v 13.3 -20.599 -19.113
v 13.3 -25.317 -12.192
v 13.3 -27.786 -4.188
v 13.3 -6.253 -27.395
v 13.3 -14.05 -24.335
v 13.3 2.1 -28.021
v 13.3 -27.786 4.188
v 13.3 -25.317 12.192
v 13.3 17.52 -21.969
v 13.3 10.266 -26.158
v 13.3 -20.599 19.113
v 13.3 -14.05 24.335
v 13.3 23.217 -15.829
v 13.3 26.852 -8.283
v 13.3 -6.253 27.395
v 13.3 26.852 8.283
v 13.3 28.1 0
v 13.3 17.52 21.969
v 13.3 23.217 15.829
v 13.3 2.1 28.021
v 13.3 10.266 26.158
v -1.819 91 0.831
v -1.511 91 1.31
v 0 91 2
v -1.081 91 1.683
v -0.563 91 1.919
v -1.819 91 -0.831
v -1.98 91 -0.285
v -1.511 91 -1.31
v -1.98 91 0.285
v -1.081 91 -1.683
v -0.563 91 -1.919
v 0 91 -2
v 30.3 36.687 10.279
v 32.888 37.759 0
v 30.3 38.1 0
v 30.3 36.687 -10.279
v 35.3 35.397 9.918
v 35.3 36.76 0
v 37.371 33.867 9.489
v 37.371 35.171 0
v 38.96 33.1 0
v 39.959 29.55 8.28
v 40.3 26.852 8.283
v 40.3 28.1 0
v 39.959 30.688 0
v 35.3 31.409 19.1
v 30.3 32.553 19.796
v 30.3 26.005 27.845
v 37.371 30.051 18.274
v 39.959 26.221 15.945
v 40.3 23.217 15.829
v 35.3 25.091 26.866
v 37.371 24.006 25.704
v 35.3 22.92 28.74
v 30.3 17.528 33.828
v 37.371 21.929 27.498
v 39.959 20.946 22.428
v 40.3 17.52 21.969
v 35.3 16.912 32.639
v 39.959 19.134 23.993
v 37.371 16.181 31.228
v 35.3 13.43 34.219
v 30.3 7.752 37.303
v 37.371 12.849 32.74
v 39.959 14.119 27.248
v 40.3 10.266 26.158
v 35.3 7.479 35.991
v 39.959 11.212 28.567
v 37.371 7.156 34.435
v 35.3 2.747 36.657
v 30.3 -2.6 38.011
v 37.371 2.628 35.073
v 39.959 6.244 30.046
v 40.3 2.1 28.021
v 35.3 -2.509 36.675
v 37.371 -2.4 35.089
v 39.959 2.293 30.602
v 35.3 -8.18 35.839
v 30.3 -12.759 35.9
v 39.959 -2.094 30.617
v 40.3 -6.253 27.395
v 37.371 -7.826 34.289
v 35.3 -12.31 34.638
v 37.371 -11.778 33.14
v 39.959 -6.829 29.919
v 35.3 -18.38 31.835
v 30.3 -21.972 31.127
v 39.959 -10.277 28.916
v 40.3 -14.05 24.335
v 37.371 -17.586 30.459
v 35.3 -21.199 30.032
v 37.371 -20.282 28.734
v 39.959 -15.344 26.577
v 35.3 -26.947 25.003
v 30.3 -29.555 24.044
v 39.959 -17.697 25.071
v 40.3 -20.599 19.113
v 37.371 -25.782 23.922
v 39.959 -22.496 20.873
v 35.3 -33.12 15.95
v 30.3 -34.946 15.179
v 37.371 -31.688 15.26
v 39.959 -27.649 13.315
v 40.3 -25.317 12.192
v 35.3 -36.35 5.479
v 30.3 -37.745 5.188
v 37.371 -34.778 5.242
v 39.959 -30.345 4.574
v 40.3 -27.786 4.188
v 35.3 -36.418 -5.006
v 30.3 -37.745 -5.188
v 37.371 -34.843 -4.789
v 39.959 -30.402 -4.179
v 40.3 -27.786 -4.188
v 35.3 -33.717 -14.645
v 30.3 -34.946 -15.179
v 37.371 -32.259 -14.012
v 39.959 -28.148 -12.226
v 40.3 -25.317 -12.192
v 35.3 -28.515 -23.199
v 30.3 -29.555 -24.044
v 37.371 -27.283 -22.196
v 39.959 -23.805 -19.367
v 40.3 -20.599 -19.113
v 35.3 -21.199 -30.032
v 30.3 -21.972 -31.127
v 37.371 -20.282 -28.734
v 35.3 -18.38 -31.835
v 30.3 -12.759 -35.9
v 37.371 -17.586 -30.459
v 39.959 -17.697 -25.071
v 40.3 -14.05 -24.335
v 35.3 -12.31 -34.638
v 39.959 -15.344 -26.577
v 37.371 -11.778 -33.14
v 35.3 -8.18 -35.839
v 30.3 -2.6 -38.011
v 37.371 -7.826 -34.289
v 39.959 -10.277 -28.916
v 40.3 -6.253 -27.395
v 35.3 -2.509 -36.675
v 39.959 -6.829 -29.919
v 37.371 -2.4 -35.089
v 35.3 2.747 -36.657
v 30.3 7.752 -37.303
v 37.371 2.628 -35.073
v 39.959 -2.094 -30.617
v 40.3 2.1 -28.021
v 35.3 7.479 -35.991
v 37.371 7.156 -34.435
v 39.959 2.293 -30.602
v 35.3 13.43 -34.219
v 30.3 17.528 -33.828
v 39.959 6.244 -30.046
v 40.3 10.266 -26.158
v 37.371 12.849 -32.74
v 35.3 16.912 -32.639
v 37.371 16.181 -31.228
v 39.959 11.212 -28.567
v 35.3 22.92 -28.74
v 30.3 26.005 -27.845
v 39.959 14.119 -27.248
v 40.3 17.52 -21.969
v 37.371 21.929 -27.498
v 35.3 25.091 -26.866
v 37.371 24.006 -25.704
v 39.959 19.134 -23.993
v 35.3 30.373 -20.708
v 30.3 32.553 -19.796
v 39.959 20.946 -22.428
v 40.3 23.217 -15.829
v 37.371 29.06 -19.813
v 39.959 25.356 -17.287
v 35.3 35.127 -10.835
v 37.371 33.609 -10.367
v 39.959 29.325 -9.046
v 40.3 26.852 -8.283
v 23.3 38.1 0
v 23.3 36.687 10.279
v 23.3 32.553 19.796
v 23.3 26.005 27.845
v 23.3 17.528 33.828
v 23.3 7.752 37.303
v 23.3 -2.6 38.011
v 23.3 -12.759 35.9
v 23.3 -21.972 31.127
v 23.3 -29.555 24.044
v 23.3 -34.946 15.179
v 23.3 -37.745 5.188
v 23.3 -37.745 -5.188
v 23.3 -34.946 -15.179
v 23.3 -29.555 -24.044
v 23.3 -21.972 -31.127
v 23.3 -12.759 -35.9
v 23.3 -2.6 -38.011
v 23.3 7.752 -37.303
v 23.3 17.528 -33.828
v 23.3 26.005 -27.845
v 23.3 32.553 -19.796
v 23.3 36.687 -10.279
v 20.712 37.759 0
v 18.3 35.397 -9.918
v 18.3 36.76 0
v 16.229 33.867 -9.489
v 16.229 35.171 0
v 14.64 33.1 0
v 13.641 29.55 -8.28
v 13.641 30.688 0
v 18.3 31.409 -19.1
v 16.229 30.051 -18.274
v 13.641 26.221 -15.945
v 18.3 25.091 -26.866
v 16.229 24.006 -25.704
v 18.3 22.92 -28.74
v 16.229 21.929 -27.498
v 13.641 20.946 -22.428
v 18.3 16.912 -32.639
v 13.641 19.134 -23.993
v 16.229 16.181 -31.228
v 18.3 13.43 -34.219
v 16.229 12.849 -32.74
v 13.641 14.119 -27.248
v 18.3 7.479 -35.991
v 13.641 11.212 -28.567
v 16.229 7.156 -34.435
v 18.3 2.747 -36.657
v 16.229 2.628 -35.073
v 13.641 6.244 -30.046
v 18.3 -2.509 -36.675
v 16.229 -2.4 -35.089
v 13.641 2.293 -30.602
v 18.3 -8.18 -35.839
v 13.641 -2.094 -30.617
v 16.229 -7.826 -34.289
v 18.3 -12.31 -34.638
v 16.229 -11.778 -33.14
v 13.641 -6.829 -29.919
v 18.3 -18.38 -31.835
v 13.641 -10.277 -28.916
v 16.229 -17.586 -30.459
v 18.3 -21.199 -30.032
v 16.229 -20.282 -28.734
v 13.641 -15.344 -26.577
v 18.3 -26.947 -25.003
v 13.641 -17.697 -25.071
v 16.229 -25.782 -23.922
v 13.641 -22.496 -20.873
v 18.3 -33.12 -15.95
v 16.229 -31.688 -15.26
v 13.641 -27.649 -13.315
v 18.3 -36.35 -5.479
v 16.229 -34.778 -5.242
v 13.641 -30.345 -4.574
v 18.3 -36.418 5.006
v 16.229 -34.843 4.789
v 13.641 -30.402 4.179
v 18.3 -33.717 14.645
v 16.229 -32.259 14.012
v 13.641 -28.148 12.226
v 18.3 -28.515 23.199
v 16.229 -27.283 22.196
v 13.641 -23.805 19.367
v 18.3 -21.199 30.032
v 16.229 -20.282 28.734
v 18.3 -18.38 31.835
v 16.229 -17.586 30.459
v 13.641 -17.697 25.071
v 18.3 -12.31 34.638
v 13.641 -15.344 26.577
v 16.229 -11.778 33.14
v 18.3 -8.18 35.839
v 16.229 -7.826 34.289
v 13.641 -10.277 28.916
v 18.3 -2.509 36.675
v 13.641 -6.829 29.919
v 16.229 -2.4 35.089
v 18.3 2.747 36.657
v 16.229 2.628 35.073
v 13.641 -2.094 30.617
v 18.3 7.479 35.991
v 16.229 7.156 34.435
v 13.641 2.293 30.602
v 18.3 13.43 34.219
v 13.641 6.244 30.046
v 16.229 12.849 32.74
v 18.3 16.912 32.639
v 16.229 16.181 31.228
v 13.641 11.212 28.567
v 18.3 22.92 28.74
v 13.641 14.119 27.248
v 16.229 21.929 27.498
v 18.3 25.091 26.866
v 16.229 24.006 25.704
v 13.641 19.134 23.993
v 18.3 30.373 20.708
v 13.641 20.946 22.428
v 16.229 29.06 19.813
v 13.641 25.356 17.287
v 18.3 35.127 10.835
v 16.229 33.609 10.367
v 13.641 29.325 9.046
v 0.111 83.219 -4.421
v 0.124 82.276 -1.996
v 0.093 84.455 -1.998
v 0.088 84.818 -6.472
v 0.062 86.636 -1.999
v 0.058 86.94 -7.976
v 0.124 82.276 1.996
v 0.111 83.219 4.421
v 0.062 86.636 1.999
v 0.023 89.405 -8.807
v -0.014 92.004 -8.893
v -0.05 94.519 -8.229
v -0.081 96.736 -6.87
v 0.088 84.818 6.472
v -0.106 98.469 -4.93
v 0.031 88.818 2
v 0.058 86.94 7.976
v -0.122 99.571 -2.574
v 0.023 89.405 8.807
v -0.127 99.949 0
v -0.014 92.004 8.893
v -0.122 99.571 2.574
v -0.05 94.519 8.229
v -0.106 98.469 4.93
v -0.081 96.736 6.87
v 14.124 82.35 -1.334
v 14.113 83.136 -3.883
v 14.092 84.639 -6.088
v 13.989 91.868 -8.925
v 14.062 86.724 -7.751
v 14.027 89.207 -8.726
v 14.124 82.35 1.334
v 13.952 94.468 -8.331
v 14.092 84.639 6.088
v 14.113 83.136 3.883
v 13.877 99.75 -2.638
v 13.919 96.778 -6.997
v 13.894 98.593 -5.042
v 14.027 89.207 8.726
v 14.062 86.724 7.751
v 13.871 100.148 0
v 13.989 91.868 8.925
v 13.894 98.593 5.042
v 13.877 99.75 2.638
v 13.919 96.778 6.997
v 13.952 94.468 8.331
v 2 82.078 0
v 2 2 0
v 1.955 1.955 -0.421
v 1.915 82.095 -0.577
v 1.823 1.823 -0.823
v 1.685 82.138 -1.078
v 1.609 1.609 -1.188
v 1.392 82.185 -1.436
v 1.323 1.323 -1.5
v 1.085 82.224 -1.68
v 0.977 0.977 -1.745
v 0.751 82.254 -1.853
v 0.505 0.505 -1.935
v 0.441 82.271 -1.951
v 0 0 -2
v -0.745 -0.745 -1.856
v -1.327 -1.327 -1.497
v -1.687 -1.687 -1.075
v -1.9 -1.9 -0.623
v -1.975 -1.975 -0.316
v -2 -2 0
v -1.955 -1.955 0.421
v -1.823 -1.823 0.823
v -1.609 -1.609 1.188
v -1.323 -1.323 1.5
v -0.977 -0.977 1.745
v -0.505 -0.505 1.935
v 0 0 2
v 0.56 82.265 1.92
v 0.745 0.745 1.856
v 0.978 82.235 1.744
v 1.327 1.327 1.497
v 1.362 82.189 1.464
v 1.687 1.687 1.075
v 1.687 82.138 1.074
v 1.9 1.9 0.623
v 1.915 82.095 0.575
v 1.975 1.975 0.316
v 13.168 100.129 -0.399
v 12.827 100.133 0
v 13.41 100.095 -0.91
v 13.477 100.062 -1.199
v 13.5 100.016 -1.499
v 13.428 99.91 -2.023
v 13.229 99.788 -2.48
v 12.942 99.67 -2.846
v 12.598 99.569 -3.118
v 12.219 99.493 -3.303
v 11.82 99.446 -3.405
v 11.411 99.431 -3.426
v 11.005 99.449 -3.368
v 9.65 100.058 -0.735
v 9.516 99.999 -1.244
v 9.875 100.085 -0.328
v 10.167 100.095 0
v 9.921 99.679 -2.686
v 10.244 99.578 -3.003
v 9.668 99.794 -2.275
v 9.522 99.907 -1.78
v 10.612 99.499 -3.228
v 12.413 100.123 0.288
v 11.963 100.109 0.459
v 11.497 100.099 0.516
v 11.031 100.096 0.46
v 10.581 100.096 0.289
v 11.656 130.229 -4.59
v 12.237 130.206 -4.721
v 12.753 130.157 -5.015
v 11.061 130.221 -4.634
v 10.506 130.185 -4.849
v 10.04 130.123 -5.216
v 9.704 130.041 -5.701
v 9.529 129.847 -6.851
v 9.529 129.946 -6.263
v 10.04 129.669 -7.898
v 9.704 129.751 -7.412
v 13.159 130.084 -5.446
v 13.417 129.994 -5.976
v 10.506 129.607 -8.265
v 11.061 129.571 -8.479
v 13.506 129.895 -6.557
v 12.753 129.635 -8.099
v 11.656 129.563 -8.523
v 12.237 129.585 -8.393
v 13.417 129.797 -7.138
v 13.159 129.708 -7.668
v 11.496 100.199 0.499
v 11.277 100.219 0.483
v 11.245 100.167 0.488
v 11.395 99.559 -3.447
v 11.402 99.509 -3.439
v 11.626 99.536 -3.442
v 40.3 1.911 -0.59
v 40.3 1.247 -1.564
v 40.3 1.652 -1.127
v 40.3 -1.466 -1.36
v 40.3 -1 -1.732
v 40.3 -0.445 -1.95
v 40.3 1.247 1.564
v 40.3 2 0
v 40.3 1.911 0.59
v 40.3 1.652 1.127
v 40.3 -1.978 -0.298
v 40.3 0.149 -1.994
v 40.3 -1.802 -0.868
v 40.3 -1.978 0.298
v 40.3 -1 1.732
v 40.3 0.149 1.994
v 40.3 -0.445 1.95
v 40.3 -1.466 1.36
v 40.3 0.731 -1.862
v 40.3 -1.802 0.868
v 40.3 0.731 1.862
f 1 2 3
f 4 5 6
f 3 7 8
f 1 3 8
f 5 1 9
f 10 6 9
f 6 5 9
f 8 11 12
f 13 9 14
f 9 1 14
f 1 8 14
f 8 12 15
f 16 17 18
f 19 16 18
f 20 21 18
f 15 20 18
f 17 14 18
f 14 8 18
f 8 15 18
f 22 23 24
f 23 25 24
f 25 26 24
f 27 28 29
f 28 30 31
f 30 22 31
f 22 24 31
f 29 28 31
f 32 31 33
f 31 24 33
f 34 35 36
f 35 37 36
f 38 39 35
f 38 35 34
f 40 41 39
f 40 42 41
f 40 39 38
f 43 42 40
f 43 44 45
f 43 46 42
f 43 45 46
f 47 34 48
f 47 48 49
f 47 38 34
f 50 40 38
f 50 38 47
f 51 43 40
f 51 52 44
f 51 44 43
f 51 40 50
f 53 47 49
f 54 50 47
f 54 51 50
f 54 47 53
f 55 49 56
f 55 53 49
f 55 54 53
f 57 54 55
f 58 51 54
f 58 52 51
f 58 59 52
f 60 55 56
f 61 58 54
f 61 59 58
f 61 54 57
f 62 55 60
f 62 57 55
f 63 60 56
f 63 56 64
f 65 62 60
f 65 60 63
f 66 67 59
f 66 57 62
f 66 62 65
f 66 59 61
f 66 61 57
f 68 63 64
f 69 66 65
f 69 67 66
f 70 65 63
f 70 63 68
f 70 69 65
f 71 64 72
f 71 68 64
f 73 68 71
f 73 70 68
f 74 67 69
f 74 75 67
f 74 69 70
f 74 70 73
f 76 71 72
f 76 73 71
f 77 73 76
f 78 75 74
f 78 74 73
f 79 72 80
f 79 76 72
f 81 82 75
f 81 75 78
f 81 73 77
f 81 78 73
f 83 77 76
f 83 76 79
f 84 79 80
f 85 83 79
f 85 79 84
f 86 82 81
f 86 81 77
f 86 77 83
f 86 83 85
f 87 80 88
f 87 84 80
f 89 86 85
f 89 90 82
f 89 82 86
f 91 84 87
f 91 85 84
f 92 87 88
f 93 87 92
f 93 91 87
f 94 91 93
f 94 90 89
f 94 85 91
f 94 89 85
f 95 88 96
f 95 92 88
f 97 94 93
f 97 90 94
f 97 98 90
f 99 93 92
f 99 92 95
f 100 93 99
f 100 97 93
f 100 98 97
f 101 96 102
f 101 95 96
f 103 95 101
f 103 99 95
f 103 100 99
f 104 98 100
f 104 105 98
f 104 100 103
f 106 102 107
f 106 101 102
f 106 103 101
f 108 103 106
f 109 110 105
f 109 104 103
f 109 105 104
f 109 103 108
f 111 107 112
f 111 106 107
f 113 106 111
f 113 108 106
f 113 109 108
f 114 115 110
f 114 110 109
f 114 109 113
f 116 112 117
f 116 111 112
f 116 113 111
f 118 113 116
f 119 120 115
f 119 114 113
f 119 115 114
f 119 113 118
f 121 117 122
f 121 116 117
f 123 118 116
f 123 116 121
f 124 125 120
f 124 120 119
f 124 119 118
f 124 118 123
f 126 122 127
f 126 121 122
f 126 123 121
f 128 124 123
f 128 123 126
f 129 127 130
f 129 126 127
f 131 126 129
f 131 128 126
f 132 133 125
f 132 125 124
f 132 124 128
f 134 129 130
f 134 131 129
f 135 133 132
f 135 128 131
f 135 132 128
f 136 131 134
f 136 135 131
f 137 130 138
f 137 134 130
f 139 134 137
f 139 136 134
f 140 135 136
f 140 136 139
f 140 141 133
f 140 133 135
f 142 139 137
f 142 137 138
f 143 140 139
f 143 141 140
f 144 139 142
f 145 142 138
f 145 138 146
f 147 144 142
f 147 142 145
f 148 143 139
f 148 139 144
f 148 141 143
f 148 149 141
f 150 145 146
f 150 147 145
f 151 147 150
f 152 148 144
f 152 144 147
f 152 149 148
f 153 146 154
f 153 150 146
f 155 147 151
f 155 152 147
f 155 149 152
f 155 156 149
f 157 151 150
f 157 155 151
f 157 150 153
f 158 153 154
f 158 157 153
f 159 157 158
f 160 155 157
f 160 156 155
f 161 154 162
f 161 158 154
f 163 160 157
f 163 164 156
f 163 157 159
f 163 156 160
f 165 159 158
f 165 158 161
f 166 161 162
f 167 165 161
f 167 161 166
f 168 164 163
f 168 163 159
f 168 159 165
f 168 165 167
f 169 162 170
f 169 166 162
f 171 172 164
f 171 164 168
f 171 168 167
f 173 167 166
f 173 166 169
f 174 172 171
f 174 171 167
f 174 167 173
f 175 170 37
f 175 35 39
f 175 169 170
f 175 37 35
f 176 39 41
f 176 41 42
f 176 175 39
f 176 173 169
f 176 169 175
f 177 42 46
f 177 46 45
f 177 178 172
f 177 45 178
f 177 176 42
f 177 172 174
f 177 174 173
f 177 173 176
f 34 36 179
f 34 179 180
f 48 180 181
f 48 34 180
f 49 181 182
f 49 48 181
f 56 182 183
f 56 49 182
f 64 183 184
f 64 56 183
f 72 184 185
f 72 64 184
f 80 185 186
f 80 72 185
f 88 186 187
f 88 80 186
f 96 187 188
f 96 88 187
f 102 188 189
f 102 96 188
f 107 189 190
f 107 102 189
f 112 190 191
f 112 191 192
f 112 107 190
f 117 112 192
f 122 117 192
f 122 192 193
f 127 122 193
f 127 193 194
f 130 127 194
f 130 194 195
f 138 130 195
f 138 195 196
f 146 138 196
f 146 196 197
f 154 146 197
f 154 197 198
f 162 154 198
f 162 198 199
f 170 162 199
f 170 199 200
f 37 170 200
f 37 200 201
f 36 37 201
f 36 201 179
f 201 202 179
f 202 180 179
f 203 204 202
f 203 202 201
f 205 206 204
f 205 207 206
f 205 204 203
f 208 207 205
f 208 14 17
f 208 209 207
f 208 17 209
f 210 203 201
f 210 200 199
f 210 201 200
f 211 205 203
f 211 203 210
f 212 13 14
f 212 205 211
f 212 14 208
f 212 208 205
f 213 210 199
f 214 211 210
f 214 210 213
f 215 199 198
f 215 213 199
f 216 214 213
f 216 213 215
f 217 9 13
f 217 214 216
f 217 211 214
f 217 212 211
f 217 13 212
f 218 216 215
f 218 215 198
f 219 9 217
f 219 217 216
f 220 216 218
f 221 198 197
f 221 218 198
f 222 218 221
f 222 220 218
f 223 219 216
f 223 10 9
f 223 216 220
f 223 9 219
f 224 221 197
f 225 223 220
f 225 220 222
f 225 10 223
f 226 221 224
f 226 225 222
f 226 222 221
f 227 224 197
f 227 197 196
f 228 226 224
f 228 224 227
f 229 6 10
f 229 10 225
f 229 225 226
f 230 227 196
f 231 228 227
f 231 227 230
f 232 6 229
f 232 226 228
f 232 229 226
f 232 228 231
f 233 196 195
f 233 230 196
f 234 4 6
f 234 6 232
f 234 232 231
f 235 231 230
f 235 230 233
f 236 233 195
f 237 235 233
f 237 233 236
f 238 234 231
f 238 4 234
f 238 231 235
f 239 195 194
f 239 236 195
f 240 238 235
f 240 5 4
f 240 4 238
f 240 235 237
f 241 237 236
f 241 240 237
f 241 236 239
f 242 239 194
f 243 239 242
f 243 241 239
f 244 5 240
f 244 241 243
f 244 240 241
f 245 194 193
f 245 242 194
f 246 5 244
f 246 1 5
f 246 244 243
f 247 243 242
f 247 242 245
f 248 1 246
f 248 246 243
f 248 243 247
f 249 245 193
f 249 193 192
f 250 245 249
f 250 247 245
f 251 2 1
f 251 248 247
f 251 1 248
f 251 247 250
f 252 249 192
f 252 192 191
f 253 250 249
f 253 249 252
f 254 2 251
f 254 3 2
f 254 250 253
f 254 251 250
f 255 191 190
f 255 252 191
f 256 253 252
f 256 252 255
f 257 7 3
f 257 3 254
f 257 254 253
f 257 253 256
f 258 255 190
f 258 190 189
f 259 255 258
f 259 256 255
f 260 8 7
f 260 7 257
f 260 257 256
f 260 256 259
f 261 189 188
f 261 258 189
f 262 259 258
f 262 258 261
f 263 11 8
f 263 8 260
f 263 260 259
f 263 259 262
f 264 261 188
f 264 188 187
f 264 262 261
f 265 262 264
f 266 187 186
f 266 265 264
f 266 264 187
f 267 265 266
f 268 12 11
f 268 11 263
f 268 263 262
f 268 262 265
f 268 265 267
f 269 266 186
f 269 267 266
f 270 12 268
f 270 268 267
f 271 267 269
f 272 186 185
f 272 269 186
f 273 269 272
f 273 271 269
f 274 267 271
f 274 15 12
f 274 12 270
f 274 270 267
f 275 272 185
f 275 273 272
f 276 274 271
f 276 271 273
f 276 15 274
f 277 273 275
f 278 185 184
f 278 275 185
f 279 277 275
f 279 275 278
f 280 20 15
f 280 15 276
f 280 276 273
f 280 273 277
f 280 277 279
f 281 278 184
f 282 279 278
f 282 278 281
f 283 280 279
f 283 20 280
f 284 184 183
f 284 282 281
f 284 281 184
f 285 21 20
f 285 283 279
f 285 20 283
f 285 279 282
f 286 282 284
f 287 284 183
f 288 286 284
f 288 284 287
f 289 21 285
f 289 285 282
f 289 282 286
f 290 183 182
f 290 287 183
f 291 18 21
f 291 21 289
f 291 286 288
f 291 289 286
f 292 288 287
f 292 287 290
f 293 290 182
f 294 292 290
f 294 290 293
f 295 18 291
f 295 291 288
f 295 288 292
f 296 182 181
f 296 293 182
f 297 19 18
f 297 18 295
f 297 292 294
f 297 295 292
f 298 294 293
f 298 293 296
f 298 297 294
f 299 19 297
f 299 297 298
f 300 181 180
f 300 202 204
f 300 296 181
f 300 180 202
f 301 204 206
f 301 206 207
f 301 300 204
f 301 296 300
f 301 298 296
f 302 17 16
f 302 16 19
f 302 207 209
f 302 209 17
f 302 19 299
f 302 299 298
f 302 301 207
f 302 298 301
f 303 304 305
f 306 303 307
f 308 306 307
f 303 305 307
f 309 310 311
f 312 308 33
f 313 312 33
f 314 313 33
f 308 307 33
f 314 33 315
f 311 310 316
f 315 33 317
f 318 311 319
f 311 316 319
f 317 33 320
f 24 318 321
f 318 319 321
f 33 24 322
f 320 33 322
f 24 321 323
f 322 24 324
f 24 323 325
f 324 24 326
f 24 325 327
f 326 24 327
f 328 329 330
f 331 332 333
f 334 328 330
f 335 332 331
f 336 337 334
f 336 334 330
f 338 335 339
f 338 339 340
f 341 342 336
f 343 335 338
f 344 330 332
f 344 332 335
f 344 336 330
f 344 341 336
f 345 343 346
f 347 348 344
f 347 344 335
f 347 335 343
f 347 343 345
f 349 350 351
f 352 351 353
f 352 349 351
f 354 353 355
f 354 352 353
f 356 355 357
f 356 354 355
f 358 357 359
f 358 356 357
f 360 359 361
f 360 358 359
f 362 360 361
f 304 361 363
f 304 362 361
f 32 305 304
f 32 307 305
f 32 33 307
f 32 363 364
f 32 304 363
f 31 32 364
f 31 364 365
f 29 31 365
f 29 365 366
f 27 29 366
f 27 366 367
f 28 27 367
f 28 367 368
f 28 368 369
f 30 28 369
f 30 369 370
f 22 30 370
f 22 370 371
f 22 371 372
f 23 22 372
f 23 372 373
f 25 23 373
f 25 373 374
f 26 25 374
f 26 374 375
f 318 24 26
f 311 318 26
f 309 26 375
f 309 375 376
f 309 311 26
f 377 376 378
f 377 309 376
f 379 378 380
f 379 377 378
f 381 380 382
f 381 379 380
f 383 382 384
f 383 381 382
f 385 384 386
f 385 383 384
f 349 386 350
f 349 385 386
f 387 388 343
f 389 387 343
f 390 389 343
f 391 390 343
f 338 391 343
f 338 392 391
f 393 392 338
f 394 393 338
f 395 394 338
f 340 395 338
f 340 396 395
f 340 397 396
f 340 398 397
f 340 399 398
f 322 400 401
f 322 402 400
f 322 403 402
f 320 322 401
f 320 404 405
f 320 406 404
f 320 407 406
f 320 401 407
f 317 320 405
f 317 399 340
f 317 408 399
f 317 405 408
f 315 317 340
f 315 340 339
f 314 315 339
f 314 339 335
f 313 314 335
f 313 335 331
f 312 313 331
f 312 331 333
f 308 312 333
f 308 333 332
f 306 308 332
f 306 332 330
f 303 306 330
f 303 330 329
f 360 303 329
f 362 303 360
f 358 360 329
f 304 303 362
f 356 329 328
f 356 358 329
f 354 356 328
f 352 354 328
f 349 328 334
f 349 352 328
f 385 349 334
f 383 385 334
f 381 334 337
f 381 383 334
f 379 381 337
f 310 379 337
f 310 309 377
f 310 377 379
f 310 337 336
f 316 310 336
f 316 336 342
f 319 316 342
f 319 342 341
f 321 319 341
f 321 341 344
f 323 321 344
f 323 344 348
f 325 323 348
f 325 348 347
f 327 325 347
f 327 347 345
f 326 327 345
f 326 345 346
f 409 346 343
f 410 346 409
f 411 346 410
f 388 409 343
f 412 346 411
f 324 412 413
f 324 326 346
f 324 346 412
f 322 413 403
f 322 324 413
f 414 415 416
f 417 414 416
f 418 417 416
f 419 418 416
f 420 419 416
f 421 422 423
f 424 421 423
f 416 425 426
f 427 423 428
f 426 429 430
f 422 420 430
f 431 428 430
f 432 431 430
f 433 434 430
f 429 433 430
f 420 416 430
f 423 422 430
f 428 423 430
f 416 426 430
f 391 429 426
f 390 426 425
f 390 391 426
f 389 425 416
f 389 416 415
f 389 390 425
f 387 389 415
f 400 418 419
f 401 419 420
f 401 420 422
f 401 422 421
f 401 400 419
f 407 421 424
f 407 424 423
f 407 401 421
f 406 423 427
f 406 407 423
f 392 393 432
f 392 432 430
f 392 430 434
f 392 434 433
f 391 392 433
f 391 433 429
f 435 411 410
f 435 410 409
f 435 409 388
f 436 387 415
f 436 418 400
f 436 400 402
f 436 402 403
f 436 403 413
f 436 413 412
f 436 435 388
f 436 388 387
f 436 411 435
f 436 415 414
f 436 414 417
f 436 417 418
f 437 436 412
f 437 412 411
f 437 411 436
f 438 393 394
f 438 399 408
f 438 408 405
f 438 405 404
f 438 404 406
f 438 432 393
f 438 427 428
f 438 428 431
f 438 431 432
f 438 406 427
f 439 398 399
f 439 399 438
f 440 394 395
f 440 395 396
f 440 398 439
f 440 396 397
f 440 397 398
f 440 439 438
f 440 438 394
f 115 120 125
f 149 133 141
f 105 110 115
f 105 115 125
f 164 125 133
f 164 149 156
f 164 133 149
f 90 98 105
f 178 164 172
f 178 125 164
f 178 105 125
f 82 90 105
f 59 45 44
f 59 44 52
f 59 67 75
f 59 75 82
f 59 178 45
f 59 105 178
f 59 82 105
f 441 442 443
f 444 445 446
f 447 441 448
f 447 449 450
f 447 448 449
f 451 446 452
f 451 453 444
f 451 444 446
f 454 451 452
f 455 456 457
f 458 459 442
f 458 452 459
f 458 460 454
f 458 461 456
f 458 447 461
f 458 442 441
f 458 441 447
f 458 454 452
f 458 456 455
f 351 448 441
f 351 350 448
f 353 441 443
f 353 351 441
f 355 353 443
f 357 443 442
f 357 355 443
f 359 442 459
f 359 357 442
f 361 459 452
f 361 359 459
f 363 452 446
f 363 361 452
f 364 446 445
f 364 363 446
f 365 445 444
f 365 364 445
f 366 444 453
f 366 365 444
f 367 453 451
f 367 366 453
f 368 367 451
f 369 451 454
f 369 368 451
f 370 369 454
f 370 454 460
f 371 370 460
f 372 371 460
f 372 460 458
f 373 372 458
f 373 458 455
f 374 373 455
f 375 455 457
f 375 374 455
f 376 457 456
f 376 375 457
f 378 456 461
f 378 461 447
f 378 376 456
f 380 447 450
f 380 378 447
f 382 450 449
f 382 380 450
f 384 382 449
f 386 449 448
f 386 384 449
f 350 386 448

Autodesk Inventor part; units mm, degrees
ref_plane "Work Plane1" through (0, 91, 0) normal (0.9999, 0.0142, 0) x (-0.0142, 0.9999, 0)
sketch "Sketch1" plane through (0, 91, 0) normal (0.9999, 0.0142, 0) x (-0.0142, 0.9999, 0)
  circle A0 centre (0, 0) radius 8.95
  point P0 (-90.9908, 0)
  dimension "d3" = 17.9
extrude "Extrusion1" add sketch "Sketch1" along normal blind 14
ref_plane "Work Plane2" through (40.3, 0, 0) normal (1, 0, 0) x (0, 1, 0)
sketch "Sketch2" plane through (40.3, 0, 0) normal (1, 0, 0) x (0, 1, 0)
  circle A0 centre (0, 0) radius 2
  dimension "d6" = 4
ref_plane "Work Plane3" through (11.5062, 129.8959, -6.5569) normal (-0.0002, -0.986, 0.1669) x (1, -0.0002, 0)
sketch "Sketch3" plane through (11.5062, 129.8959, -6.5569) normal (-0.0002, -0.986, 0.1669) x (1, -0.0002, 0)
  circle A0 centre (0, 0) radius 2
  point P0 (-11.4815, -15.2165)
  dimension "d7" = 4
sketch3d "3D Sketch1"
  line L0 (11.5062, 129.8959, -6.5569) -> (11.4988, 91.1633, 0)
  dimension "d0" = 40.3
  dimension "d1" = 91
  dimension "d2" = 11.5
sweep "Sweep1" add profiles "Sketch3" path "3D Sketch1"
sketch3d "3D Sketch1 for Sweep2"
  line L0 (40.3, 0, 0) -> (0, 0, 0)
  line L1 (0, 0, 0) -> (0, 91, 0)
  dimension "d0" = 40.3
  dimension "d1" = 91
  dimension "d2" = 11.5
sweep "Sweep2" add profiles "Sketch2" path "3D Sketch1 for Sweep2"
sketch "Sketch4" plane through (40.3, 0, 0) normal (1, 0, 0) x (0, 1, 0)
  circle A0 centre (0, 0) radius 38.1
  dimension "d12" = 76.2
extrude "Extrusion2" add sketch "Sketch4" against normal blind 27 separate body
fillet "Fillet1" radius 10 2 edges at (40.3, -38.1, 0) (13.3, -38.1, 0)
properties part number "Nose Gear Rod and Wheel"
